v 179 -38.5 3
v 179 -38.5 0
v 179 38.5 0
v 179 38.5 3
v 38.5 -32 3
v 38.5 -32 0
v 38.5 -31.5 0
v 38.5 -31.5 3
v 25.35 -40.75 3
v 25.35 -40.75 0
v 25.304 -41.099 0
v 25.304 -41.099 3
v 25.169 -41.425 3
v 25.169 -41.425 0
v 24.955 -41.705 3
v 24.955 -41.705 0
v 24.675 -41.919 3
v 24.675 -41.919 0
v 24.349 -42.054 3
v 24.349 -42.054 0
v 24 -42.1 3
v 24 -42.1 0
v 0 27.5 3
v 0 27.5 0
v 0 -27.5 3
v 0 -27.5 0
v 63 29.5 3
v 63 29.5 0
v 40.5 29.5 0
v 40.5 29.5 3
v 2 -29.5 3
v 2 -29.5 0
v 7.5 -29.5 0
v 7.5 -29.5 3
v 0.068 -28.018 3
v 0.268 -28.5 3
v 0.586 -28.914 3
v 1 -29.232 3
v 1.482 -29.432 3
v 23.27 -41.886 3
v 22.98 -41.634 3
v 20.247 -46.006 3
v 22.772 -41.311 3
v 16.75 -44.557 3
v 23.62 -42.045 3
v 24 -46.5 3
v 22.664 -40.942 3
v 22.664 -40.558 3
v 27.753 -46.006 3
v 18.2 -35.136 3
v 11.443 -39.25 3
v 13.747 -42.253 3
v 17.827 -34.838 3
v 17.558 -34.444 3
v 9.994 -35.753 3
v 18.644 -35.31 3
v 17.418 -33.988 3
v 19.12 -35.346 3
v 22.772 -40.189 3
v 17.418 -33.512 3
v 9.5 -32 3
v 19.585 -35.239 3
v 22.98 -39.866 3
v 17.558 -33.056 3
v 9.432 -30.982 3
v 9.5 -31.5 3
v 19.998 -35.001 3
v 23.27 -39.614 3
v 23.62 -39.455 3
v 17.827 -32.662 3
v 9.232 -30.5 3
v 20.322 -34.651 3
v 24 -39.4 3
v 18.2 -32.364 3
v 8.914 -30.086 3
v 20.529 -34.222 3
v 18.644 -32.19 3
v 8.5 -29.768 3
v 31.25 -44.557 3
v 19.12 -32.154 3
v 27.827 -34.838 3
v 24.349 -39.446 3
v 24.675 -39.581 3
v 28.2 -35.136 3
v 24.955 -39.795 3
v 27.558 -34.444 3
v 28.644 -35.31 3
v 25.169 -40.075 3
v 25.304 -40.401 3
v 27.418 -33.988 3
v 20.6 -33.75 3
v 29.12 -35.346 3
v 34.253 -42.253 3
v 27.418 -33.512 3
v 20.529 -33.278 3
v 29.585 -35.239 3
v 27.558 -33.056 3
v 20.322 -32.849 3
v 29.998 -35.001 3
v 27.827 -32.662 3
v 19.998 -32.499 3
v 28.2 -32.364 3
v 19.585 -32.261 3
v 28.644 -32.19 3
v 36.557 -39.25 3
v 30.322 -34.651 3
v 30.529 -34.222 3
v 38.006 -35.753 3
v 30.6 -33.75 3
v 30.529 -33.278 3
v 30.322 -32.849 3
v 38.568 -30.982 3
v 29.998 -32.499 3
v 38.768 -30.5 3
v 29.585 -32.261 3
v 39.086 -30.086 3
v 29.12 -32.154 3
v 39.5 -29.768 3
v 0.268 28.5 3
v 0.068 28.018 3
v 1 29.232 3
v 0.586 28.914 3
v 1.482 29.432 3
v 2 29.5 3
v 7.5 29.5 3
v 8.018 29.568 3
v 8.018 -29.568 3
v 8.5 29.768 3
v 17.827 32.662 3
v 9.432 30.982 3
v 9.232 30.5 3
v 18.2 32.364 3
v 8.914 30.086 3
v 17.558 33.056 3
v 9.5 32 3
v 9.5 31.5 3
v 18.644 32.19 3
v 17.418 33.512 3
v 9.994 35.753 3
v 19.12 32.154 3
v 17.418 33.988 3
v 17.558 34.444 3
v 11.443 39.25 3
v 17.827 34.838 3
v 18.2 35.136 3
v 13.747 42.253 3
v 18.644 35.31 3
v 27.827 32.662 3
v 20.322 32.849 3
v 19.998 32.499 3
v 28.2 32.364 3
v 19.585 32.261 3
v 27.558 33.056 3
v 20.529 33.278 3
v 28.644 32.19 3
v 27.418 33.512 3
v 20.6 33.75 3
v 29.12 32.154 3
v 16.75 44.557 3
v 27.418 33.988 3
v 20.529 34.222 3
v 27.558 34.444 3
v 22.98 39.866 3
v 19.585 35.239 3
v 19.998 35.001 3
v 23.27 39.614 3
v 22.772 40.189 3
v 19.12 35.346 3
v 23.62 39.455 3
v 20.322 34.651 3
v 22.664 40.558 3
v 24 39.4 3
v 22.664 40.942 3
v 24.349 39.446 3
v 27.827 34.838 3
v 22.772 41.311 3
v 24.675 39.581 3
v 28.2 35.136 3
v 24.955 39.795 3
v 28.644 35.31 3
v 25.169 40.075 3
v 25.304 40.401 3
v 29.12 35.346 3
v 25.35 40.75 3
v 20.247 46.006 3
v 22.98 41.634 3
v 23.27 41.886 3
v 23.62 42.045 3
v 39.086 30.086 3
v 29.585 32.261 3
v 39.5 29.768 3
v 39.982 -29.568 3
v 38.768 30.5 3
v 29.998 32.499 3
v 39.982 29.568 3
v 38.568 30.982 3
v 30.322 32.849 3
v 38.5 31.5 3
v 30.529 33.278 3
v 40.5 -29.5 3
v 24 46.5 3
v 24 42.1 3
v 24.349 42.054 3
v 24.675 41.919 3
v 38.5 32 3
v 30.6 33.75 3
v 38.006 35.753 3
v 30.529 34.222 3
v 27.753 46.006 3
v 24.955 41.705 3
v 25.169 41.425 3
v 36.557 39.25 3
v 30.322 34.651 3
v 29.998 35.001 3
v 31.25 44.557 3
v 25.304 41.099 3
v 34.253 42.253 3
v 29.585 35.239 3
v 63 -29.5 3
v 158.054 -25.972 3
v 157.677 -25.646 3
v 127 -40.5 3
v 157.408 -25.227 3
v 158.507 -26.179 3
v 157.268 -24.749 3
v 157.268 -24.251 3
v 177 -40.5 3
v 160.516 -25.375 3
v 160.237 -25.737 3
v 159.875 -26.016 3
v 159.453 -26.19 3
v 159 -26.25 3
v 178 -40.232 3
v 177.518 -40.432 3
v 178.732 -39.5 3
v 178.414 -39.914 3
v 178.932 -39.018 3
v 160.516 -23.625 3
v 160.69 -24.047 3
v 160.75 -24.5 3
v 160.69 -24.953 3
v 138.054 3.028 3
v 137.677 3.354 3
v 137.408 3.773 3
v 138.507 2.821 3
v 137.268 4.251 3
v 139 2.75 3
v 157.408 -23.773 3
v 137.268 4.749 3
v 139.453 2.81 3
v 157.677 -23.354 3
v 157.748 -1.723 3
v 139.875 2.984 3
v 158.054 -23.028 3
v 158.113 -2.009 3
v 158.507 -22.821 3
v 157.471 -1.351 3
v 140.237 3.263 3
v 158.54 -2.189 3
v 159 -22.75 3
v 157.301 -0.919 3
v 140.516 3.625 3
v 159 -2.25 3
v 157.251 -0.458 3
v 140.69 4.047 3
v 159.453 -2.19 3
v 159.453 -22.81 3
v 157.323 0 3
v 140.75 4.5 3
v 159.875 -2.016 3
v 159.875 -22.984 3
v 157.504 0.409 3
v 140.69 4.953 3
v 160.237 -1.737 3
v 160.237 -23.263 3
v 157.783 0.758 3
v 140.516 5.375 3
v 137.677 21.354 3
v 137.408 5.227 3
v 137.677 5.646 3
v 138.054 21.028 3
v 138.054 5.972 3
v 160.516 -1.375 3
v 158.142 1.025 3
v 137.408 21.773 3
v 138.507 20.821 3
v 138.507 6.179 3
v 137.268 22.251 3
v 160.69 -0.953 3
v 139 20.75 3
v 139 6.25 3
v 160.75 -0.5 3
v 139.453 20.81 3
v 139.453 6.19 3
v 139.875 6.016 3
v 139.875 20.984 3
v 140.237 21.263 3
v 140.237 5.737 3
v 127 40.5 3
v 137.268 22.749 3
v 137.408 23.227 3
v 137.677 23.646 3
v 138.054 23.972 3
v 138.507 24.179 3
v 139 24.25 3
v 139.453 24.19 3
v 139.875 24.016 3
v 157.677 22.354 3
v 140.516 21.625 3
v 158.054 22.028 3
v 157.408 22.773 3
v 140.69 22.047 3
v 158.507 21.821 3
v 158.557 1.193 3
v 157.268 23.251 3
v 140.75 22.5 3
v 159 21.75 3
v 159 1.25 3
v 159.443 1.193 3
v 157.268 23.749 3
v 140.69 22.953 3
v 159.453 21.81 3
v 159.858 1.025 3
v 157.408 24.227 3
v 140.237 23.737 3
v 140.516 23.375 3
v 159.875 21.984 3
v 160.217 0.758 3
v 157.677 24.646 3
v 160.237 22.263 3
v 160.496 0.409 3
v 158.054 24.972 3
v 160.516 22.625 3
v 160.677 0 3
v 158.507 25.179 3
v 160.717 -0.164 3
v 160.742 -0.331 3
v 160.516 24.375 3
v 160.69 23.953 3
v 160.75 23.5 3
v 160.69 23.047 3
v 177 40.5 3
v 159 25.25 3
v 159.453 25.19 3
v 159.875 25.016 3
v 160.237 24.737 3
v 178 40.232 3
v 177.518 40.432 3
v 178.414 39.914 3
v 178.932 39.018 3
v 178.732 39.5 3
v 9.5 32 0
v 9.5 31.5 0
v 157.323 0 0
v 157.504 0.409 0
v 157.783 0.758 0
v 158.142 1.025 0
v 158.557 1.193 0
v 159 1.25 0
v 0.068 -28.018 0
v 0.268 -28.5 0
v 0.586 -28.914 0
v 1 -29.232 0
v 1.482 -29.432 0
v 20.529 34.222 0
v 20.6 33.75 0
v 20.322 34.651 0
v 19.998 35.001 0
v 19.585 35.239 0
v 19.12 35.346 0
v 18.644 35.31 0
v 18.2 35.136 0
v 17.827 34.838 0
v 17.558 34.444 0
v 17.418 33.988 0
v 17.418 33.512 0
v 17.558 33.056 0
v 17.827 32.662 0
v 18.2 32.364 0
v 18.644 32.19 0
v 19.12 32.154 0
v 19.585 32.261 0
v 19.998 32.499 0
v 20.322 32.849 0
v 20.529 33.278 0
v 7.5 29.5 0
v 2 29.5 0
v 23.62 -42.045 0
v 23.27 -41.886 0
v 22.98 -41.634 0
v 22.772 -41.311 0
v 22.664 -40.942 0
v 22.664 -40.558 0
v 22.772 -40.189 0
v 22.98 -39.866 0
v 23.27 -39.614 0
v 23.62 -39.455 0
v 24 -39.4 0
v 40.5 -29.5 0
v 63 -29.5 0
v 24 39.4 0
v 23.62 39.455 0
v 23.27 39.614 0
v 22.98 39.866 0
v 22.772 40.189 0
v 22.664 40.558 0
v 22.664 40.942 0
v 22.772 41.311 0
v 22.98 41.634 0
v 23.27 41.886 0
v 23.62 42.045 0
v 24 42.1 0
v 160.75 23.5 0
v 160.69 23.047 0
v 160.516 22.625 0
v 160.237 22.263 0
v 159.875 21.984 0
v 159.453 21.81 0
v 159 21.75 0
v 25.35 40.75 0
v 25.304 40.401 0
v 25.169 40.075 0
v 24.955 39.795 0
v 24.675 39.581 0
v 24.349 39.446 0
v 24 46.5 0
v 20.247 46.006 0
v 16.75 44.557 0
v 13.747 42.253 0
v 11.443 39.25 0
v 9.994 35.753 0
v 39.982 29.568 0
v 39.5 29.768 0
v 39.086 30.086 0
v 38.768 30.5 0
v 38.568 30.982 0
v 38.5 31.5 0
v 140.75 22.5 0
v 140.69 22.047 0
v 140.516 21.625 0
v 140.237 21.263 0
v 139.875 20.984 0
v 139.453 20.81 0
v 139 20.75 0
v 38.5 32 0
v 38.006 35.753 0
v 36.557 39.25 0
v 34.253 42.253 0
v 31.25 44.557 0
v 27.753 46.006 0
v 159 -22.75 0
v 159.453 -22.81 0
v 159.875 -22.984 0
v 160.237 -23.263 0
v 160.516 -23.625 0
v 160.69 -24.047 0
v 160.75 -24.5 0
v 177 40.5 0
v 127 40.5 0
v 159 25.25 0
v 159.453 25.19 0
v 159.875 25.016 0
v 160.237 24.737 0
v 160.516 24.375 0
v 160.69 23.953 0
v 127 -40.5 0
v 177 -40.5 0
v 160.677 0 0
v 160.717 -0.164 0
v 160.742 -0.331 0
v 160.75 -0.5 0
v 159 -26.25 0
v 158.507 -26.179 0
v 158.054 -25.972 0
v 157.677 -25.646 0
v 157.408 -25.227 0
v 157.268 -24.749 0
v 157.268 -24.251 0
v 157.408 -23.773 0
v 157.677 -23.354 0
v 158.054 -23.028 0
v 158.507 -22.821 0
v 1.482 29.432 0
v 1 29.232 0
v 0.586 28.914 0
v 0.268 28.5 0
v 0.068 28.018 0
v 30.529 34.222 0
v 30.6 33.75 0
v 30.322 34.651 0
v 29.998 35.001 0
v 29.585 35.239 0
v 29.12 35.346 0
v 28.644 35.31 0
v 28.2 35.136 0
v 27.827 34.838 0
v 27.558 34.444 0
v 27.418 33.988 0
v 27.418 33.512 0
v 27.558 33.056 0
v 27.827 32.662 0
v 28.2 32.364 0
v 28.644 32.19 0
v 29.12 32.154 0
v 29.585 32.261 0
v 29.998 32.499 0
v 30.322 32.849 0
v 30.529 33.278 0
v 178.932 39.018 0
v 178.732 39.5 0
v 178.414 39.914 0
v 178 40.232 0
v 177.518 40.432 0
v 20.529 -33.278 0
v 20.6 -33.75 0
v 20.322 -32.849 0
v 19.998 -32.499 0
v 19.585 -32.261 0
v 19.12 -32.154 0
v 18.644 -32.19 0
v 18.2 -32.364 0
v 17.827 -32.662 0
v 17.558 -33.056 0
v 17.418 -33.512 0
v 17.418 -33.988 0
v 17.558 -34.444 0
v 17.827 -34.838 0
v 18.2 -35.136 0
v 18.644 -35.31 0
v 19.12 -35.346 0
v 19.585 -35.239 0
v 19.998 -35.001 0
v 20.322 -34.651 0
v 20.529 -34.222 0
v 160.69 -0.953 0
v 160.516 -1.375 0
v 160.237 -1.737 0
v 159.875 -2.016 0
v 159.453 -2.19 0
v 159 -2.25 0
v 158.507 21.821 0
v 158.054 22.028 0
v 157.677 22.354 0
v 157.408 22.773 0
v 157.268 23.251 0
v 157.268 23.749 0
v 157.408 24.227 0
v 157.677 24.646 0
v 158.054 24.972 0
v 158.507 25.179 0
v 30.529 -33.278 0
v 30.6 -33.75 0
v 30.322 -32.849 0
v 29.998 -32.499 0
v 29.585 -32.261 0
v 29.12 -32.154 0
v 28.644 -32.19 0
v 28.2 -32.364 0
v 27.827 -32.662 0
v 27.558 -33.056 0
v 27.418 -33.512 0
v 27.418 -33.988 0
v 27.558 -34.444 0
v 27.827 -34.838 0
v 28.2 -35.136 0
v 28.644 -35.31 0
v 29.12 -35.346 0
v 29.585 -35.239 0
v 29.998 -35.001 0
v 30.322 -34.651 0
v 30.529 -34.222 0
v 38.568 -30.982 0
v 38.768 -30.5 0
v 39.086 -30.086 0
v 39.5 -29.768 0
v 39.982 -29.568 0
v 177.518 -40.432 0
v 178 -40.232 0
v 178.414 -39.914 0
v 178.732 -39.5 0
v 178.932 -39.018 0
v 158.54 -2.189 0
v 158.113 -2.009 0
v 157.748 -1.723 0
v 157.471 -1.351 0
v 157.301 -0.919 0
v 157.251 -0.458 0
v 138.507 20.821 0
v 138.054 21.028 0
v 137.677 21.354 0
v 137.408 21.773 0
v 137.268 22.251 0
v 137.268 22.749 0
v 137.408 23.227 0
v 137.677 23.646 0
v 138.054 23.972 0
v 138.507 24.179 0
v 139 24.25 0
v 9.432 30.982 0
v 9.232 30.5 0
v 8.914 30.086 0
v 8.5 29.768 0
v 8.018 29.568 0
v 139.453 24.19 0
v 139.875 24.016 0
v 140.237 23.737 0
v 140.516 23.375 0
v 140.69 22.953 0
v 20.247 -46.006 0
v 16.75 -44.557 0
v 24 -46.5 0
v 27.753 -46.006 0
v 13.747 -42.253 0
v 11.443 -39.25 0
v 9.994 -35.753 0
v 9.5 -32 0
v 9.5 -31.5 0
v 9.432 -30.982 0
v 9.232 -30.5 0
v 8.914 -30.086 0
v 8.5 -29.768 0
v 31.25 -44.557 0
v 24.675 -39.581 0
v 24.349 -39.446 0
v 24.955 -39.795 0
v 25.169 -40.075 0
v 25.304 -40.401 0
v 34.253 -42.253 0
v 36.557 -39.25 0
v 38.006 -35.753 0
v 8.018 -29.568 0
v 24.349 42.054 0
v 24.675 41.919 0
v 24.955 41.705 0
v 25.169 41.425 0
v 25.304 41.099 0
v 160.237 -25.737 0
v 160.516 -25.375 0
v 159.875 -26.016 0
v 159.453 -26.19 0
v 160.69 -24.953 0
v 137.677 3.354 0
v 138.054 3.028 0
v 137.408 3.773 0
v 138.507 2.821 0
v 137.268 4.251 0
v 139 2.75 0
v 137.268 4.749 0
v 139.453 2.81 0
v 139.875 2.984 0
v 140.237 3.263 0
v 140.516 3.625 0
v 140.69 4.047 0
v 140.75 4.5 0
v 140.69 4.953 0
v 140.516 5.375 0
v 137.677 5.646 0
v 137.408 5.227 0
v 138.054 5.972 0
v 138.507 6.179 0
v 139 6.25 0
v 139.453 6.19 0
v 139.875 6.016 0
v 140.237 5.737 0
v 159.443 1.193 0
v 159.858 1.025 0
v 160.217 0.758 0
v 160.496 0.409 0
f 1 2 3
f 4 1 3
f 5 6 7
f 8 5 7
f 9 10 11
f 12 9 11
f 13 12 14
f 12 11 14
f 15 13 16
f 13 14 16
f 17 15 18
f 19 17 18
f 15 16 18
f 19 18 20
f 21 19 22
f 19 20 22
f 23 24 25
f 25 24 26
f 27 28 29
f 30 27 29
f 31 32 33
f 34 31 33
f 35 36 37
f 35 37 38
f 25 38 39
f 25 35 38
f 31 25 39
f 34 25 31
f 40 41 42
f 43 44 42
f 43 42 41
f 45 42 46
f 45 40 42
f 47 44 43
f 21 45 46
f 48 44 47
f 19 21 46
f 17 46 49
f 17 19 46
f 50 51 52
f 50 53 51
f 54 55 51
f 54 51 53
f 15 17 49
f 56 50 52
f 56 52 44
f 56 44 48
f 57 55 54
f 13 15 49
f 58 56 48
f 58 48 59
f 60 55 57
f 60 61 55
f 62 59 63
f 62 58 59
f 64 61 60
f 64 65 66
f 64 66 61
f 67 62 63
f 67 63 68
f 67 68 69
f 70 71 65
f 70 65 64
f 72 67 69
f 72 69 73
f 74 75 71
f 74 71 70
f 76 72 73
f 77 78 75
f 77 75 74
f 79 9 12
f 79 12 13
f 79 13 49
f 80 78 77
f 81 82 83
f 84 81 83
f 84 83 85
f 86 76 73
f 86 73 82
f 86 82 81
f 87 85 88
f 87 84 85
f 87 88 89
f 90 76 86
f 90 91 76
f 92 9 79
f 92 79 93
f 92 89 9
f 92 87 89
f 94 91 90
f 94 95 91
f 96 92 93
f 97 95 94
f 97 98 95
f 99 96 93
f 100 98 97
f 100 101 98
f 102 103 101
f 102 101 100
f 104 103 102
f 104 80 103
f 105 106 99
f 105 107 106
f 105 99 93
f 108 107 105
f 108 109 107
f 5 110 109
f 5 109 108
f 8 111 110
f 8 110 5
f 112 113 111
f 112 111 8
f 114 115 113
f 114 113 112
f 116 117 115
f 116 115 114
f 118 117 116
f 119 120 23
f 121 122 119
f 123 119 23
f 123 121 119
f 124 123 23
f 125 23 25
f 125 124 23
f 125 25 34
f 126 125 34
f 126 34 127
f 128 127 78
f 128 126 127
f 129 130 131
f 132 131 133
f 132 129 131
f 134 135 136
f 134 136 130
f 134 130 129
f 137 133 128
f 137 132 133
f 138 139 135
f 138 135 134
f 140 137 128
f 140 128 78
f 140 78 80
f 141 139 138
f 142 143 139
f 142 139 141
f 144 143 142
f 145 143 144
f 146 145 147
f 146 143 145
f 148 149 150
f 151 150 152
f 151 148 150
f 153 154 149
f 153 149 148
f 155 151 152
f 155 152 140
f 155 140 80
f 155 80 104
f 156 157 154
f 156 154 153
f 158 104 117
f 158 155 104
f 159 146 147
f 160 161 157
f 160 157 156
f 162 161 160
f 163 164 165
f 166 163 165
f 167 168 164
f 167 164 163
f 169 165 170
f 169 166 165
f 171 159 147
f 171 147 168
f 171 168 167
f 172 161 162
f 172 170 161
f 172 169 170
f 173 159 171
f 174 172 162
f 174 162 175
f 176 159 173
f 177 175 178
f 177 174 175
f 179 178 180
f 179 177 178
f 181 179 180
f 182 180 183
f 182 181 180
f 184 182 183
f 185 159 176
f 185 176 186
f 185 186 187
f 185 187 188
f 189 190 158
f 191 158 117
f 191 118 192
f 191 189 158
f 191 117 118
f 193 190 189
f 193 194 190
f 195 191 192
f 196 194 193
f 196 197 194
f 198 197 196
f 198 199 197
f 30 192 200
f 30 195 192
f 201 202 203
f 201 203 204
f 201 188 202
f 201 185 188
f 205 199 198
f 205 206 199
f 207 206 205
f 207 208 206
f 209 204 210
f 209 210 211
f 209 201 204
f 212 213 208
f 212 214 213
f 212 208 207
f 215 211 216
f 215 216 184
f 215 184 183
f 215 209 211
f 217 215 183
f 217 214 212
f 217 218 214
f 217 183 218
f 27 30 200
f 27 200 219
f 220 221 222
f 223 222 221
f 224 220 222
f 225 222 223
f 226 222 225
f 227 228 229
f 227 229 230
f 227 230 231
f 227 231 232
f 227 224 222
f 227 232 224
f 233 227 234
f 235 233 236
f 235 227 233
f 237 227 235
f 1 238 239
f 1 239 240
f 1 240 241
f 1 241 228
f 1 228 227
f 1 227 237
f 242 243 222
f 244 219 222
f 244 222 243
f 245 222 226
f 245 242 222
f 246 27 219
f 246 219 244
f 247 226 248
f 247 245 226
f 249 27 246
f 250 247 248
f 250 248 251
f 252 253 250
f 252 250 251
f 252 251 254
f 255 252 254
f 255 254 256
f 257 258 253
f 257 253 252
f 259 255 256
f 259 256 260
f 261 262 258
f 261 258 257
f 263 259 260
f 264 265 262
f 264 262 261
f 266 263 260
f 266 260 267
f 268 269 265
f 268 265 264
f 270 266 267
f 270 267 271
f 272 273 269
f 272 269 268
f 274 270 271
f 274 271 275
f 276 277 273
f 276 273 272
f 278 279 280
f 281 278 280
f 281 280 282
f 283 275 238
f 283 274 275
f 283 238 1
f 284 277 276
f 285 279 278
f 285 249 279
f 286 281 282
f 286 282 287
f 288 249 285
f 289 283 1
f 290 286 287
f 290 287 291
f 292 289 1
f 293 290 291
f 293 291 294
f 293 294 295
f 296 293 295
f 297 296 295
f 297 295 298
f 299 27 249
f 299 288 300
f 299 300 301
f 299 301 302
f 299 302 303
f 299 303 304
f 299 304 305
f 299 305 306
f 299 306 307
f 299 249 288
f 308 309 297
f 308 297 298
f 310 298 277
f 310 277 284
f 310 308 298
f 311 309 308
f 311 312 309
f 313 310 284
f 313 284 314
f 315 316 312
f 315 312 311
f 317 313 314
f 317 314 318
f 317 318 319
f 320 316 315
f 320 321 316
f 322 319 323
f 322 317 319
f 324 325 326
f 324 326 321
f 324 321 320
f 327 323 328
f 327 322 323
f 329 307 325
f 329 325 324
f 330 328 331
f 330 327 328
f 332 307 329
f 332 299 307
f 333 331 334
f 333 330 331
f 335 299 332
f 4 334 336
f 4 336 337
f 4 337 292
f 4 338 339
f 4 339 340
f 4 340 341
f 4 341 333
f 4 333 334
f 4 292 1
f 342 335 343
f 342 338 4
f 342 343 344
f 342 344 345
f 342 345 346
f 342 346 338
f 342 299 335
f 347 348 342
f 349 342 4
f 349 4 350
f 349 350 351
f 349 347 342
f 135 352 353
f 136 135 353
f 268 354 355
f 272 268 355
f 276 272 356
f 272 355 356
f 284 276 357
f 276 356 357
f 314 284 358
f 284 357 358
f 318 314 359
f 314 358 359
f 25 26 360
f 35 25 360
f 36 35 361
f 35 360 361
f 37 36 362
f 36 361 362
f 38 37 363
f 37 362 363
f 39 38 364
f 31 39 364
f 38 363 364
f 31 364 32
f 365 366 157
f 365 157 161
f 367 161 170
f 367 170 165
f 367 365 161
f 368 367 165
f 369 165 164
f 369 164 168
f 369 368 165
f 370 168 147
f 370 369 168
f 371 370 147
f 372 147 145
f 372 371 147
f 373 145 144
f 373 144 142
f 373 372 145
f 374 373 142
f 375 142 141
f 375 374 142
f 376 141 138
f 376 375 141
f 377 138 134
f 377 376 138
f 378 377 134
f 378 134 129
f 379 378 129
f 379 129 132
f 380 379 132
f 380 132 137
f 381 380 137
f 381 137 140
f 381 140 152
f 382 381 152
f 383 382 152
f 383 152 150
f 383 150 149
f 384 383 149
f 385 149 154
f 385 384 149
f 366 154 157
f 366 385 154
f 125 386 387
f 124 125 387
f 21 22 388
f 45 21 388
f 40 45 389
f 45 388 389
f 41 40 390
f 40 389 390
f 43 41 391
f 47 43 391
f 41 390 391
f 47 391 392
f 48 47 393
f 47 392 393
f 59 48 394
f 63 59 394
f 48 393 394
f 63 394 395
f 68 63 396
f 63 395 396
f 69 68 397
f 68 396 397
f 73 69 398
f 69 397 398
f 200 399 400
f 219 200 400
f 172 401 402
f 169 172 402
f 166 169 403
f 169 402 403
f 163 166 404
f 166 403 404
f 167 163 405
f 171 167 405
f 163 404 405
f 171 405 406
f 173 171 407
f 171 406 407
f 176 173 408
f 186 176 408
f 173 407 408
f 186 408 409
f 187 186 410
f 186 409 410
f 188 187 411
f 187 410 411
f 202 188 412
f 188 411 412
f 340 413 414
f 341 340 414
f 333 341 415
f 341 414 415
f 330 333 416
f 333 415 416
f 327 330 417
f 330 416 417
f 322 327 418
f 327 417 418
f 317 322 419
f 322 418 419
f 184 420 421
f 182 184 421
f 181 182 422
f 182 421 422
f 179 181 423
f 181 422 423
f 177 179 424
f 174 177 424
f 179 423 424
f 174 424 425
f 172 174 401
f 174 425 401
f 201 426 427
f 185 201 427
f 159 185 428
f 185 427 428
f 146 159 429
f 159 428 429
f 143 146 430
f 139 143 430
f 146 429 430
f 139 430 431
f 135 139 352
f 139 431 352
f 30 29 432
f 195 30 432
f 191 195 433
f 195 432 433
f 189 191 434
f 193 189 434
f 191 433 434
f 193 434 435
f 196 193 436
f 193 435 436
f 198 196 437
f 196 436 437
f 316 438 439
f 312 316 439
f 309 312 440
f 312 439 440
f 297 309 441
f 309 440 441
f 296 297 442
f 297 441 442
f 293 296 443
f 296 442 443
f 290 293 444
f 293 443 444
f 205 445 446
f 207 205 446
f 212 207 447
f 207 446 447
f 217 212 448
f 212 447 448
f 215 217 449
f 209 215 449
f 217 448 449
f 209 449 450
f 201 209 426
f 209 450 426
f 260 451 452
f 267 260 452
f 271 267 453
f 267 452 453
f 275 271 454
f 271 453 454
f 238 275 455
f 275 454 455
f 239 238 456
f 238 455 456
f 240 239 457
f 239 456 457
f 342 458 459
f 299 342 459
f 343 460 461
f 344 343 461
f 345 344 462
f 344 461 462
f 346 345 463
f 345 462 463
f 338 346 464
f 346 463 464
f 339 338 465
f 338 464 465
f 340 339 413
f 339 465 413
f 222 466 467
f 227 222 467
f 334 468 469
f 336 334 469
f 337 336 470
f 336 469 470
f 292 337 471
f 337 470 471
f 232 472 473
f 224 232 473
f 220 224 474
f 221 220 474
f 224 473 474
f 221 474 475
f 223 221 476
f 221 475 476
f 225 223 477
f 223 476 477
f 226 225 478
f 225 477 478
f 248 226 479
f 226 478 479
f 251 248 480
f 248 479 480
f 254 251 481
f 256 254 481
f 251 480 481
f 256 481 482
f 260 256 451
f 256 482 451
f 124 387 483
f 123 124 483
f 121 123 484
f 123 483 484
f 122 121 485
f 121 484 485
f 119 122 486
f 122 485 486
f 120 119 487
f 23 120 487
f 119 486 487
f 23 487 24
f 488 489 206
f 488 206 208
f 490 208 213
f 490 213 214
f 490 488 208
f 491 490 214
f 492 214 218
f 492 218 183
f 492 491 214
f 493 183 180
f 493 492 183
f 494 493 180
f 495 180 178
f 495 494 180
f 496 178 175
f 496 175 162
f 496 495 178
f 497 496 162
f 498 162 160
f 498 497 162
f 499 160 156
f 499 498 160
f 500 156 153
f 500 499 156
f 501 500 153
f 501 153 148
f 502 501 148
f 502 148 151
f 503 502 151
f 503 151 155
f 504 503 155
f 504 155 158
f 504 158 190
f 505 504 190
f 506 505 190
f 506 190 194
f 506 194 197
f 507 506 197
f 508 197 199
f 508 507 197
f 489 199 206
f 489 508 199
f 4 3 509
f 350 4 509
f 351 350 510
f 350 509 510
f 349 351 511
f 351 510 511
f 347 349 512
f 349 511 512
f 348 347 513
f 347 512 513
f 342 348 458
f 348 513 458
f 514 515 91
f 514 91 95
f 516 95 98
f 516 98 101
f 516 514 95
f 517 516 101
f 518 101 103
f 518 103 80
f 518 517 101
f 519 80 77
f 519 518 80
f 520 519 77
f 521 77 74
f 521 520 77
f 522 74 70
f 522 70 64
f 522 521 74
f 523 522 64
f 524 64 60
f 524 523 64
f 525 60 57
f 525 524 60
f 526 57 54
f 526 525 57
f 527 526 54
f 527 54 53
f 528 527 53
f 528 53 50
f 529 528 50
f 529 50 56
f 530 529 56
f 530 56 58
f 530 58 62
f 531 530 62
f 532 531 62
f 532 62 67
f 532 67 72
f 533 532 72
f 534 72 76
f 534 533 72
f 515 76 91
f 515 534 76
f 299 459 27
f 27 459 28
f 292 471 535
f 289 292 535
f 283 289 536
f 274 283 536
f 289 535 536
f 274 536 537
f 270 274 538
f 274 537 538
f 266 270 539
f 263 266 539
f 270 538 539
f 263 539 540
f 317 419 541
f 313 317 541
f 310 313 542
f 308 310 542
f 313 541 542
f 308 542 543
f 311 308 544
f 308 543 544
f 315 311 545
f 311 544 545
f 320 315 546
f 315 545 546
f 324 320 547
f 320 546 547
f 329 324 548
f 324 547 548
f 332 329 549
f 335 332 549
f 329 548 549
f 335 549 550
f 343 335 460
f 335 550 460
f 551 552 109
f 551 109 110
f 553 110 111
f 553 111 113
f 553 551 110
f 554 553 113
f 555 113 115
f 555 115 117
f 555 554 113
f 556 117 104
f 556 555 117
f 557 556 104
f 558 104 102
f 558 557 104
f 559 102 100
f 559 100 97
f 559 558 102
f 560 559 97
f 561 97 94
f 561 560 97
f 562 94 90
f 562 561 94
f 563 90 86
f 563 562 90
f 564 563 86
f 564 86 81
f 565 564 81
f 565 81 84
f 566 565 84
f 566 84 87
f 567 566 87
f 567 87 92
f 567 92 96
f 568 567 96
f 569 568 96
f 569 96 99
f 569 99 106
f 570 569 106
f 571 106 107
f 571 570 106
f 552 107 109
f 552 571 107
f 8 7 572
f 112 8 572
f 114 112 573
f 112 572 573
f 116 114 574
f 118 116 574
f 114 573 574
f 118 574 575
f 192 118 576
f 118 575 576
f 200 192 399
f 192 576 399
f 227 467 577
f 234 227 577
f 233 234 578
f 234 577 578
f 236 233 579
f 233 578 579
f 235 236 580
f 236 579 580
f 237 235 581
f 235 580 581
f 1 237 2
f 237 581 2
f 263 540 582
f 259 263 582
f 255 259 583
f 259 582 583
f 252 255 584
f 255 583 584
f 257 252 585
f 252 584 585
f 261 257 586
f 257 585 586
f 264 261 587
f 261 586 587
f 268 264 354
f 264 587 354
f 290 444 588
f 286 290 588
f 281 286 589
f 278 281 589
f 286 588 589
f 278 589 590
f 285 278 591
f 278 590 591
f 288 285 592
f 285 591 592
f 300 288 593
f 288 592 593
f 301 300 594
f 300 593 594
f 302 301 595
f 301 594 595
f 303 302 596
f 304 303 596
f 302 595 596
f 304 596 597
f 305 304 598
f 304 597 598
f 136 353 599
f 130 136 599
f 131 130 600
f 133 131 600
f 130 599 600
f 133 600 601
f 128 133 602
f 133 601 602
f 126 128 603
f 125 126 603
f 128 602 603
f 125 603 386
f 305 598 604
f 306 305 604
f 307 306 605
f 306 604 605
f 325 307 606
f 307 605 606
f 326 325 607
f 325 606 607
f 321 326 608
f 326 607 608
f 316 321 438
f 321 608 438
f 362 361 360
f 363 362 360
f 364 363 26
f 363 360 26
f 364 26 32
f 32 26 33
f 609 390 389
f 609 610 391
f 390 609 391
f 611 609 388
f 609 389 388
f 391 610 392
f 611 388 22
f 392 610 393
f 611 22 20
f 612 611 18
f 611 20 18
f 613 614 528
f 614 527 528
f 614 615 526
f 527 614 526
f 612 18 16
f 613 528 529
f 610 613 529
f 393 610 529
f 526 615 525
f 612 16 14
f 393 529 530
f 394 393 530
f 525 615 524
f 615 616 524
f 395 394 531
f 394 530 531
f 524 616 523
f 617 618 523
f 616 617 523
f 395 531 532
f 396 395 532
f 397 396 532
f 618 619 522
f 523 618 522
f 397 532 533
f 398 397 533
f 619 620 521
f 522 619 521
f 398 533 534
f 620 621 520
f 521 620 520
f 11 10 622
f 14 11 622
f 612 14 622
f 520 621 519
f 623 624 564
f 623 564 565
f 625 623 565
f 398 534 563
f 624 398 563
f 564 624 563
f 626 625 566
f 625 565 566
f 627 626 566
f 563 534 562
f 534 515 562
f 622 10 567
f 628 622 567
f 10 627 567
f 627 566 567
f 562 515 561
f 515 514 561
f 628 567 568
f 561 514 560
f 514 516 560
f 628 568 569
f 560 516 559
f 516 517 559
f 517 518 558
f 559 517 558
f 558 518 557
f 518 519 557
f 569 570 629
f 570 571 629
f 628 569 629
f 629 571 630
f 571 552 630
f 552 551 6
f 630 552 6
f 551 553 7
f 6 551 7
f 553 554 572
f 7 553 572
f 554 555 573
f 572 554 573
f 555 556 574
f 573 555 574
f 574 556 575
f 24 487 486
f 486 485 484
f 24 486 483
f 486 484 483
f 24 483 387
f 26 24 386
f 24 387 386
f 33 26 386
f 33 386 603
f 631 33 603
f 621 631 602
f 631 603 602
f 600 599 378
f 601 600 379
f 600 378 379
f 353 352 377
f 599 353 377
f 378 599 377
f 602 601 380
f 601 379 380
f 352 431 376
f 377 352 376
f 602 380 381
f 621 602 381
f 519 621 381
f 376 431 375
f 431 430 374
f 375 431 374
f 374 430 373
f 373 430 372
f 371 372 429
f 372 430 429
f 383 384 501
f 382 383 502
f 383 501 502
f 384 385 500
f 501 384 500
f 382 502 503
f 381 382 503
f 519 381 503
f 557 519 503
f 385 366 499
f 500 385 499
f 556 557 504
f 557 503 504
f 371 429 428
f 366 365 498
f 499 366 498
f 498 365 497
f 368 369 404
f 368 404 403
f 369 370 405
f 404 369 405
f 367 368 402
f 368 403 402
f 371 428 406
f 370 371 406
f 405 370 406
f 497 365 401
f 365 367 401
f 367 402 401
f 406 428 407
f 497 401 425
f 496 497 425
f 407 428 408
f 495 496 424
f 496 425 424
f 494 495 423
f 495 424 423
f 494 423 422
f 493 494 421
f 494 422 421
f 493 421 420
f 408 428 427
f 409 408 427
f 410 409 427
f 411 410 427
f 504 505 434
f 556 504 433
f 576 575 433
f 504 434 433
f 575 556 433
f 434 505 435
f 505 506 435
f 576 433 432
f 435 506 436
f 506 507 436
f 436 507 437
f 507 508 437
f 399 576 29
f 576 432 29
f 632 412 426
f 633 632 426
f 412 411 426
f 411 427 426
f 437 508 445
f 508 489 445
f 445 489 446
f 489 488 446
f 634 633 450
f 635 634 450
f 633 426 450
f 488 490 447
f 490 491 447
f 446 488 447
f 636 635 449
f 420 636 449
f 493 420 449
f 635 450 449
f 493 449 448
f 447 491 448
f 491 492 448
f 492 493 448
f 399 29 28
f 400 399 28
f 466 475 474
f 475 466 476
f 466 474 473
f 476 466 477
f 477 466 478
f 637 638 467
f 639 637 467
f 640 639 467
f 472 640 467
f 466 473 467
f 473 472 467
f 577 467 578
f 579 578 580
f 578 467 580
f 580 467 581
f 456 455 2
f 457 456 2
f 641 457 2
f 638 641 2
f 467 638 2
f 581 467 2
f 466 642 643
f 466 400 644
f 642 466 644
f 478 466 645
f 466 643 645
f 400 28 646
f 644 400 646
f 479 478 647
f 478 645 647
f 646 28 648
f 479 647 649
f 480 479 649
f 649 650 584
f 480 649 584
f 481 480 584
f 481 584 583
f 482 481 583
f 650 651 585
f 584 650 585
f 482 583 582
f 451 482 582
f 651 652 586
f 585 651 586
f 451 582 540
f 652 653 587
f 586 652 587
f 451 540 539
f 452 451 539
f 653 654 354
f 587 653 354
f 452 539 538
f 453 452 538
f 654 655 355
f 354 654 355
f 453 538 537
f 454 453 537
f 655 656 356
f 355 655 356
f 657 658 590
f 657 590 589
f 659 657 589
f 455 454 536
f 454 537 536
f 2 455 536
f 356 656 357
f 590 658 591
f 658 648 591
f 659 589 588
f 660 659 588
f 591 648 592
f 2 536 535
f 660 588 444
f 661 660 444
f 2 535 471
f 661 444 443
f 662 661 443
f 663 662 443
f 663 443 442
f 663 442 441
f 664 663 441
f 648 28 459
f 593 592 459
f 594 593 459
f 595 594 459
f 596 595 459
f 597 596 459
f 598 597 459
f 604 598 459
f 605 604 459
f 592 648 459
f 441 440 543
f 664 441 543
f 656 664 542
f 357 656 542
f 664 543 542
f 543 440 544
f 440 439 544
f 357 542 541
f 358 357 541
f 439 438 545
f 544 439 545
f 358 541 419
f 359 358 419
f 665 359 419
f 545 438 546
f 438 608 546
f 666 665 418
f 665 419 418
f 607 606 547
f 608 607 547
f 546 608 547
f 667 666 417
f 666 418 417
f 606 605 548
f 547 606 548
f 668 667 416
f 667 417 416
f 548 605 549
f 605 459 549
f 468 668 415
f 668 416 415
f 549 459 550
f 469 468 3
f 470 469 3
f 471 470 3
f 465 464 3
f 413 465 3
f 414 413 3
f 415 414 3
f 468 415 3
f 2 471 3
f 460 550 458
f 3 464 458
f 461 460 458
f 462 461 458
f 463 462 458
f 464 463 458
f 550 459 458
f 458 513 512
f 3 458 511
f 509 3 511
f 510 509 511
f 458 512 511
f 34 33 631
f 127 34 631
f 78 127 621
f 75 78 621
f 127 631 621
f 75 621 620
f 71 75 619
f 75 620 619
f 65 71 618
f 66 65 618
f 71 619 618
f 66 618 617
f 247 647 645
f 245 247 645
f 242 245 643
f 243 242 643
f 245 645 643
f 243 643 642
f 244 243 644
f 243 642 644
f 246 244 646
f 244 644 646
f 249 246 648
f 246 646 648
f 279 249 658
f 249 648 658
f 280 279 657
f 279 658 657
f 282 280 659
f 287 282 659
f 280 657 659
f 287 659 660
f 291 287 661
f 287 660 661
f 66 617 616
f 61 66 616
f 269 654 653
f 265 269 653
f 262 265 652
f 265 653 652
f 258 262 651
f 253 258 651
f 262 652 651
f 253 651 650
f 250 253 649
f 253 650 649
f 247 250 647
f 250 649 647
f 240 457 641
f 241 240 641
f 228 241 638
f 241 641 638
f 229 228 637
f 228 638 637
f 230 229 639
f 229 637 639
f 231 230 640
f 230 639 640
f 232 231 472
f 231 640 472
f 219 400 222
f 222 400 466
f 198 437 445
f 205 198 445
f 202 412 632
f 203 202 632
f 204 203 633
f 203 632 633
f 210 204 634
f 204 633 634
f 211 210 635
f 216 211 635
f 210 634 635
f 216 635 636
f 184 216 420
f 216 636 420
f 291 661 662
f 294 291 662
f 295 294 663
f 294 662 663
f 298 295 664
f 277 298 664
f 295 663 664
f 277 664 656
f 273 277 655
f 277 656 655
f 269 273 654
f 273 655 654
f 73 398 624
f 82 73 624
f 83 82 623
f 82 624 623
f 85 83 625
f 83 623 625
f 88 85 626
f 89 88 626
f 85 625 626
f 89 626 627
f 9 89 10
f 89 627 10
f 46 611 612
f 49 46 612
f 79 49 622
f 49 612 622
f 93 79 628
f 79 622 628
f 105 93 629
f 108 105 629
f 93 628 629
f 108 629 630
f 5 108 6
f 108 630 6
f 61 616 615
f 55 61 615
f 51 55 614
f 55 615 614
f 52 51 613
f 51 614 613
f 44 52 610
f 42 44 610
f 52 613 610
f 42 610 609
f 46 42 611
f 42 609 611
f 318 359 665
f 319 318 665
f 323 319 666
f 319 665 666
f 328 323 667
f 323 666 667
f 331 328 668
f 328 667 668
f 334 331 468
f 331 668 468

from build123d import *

# Parameters (mm, degrees)
F0_R     = 1.6
F1_DEPTH = 3


with BuildPart() as f1:
    # F0 (on Top) → F1 (new body)
    with BuildSketch(Plane.XY):
        Polygon((63, 29.5), (63, 0), (127, 0), (127, 40.5), align=None)
        with BuildLine():
            Line((127, 0), (63, 0))
            Line((63, 0), (24, 0))
            Line((24, 0), (24, -39.4))
            ThreePointArc((24, -39.4), (24.954594, -39.795406), (25.35, -40.75))
            ThreePointArc((25.35, -40.75), (24.954594, -41.704594), (24, -42.1))
            Line((24, -42.1), (24, -46.5))
            ThreePointArc((24, -46.5), (34.253048, -42.253048), (38.5, -32))
            Line((38.5, -32), (38.5, -31.5))
            ThreePointArc((38.5, -31.5), (39.085786, -30.085786), (40.5, -29.5))
            Line((40.5, -29.5), (63, -29.5))
            Line((63, -29.5), (127, -40.5))
            Line((127, -40.5), (139, -40.5))
            Line((139, -40.5), (139, 0))
            Line((139, 0), (127, 0))
        make_face()
        with Locations((29, -33.75)):
            Circle(F0_R, mode=Mode.SUBTRACT)
        with BuildLine():
            Line((24, 0), (63, 0))
            Line((63, 0), (63, 29.5))
            Line((63, 29.5), (40.5, 29.5))
            ThreePointArc((40.5, 29.5), (39.085786, 30.085786), (38.5, 31.5))
            Line((38.5, 31.5), (38.5, 32))
            Line((38.5, 32), (24, 32))
            Line((24, 32), (24, 0))
        make_face()
        with BuildLine():
            Line((127, 40.5), (127, 0))
            Line((127, 0), (139, 0))
            Line((139, 0), (139, 2.75))
            ThreePointArc((139, 2.75), (137.25, 4.5), (139, 6.25))
            Line((139, 6.25), (139, 20.75))
            ThreePointArc((139, 20.75), (137.25, 22.5), (139, 24.25))
            Line((139, 24.25), (139, 40.5))
            Line((139, 40.5), (127, 40.5))
        make_face()
        with BuildLine():
            Line((24, -39.4), (24, 0))
            Line((24, 0), (0, 0))
            Line((0, 0), (0, -27.5))
            ThreePointArc((0, -27.5), (0.585786, -28.914214), (2, -29.5))
            Line((2, -29.5), (7.5, -29.5))
            ThreePointArc((7.5, -29.5), (8.914214, -30.085786), (9.5, -31.5))
            Line((9.5, -31.5), (9.5, -32))
            ThreePointArc((9.5, -32), (13.746952, -42.253048), (24, -46.5))
            Line((24, -46.5), (24, -42.1))
            ThreePointArc((24, -42.1), (22.65, -40.75), (24, -39.4))
        make_face()
        with Locations((19, -33.75)):
            Circle(F0_R, mode=Mode.SUBTRACT)
        with BuildLine():
            Line((0, 0), (24, 0))
            Line((24, 0), (24, 32))
            Line((24, 32), (9.5, 32))
            Line((9.5, 32), (9.5, 31.5))
            ThreePointArc((9.5, 31.5), (8.914214, 30.085786), (7.5, 29.5))
            Line((7.5, 29.5), (2, 29.5))
            ThreePointArc((2, 29.5), (0.585786, 28.914214), (0, 27.5))
            Line((0, 27.5), (0, 0))
        make_face()
        with BuildLine():
            Line((139, 2.75), (139, 0))
            Line((139, 0), (157.322949, 0))
            ThreePointArc((157.322949, 0), (157.954175, 0.903122), (159, 1.25))
            Line((159, 1.25), (159, 21.75))
            ThreePointArc((159, 21.75), (157.25, 23.5), (159, 25.25))
            Line((159, 25.25), (159, 40.5))
            Line((159, 40.5), (139, 40.5))
            Line((139, 40.5), (139, 24.25))
            ThreePointArc((139, 24.25), (140.237437, 23.737437), (140.75, 22.5))
            ThreePointArc((140.75, 22.5), (140.237437, 21.262563), (139, 20.75))
            Line((139, 20.75), (139, 6.25))
            ThreePointArc((139, 6.25), (140.237437, 5.737437), (140.75, 4.5))
            ThreePointArc((140.75, 4.5), (140.237437, 3.262563), (139, 2.75))
        make_face()
        with BuildLine():
            Line((157.322949, 0), (139, 0))
            Line((139, 0), (139, -40.5))
            Line((139, -40.5), (159, -40.5))
            Line((159, -40.5), (159, -26.25))
            ThreePointArc((159, -26.25), (157.25, -24.5), (159, -22.75))
            Line((159, -22.75), (159, -2.25))
            ThreePointArc((159, -2.25), (157.596878, -1.545825), (157.322949, 0))
        make_face()
        with BuildLine():
            Line((24, 39.4), (24, 32))
            Line((24, 32), (38.5, 32))
            ThreePointArc((38.5, 32), (34.253048, 42.253048), (24, 46.5))
            Line((24, 46.5), (24, 42.1))
            ThreePointArc((24, 42.1), (24.954594, 41.704594), (25.35, 40.75))
            ThreePointArc((25.35, 40.75), (24.954594, 39.795406), (24, 39.4))
        make_face()
        with Locations((29, 33.75)):
            Circle(F0_R, mode=Mode.SUBTRACT)
        with BuildLine():
            Line((9.5, 32), (24, 32))
            Line((24, 32), (24, 39.4))
            ThreePointArc((24, 39.4), (22.65, 40.75), (24, 42.1))
            Line((24, 42.1), (24, 46.5))
            ThreePointArc((24, 46.5), (13.746952, 42.253048), (9.5, 32))
        make_face()
        with Locations((19, 33.75)):
            Circle(F0_R, mode=Mode.SUBTRACT)
        with BuildLine():
            Line((159, 21.75), (159, 1.25))
            ThreePointArc((159, 1.25), (160.045825, 0.903122), (160.677051, 0))
            Line((160.677051, 0), (179, 0))
            Line((179, 0), (179, 38.5))
            ThreePointArc((179, 38.5), (178.414214, 39.914214), (177, 40.5))
            Line((177, 40.5), (159, 40.5))
            Line((159, 40.5), (159, 25.25))
            ThreePointArc((159, 25.25), (160.237437, 24.737437), (160.75, 23.5))
            ThreePointArc((160.75, 23.5), (160.237437, 22.262563), (159, 21.75))
        make_face()
        with BuildLine():
            ThreePointArc((160.75, -0.5), (160.237437, -1.737437), (159, -2.25))
            Line((159, -2.25), (159, -22.75))
            ThreePointArc((159, -22.75), (160.237437, -23.262563), (160.75, -24.5))
            ThreePointArc((160.75, -24.5), (160.237437, -25.737437), (159, -26.25))
            Line((159, -26.25), (159, -40.5))
            Line((159, -40.5), (177, -40.5))
            ThreePointArc((177, -40.5), (178.414214, -39.914214), (179, -38.5))
            Line((179, -38.5), (179, 0))
            Line((179, 0), (160.677051, 0))
            ThreePointArc((160.677051, 0), (160.731667, -0.247353), (160.75, -0.5))
        make_face()
    extrude(amount=F1_DEPTH)


solid = f1.part
